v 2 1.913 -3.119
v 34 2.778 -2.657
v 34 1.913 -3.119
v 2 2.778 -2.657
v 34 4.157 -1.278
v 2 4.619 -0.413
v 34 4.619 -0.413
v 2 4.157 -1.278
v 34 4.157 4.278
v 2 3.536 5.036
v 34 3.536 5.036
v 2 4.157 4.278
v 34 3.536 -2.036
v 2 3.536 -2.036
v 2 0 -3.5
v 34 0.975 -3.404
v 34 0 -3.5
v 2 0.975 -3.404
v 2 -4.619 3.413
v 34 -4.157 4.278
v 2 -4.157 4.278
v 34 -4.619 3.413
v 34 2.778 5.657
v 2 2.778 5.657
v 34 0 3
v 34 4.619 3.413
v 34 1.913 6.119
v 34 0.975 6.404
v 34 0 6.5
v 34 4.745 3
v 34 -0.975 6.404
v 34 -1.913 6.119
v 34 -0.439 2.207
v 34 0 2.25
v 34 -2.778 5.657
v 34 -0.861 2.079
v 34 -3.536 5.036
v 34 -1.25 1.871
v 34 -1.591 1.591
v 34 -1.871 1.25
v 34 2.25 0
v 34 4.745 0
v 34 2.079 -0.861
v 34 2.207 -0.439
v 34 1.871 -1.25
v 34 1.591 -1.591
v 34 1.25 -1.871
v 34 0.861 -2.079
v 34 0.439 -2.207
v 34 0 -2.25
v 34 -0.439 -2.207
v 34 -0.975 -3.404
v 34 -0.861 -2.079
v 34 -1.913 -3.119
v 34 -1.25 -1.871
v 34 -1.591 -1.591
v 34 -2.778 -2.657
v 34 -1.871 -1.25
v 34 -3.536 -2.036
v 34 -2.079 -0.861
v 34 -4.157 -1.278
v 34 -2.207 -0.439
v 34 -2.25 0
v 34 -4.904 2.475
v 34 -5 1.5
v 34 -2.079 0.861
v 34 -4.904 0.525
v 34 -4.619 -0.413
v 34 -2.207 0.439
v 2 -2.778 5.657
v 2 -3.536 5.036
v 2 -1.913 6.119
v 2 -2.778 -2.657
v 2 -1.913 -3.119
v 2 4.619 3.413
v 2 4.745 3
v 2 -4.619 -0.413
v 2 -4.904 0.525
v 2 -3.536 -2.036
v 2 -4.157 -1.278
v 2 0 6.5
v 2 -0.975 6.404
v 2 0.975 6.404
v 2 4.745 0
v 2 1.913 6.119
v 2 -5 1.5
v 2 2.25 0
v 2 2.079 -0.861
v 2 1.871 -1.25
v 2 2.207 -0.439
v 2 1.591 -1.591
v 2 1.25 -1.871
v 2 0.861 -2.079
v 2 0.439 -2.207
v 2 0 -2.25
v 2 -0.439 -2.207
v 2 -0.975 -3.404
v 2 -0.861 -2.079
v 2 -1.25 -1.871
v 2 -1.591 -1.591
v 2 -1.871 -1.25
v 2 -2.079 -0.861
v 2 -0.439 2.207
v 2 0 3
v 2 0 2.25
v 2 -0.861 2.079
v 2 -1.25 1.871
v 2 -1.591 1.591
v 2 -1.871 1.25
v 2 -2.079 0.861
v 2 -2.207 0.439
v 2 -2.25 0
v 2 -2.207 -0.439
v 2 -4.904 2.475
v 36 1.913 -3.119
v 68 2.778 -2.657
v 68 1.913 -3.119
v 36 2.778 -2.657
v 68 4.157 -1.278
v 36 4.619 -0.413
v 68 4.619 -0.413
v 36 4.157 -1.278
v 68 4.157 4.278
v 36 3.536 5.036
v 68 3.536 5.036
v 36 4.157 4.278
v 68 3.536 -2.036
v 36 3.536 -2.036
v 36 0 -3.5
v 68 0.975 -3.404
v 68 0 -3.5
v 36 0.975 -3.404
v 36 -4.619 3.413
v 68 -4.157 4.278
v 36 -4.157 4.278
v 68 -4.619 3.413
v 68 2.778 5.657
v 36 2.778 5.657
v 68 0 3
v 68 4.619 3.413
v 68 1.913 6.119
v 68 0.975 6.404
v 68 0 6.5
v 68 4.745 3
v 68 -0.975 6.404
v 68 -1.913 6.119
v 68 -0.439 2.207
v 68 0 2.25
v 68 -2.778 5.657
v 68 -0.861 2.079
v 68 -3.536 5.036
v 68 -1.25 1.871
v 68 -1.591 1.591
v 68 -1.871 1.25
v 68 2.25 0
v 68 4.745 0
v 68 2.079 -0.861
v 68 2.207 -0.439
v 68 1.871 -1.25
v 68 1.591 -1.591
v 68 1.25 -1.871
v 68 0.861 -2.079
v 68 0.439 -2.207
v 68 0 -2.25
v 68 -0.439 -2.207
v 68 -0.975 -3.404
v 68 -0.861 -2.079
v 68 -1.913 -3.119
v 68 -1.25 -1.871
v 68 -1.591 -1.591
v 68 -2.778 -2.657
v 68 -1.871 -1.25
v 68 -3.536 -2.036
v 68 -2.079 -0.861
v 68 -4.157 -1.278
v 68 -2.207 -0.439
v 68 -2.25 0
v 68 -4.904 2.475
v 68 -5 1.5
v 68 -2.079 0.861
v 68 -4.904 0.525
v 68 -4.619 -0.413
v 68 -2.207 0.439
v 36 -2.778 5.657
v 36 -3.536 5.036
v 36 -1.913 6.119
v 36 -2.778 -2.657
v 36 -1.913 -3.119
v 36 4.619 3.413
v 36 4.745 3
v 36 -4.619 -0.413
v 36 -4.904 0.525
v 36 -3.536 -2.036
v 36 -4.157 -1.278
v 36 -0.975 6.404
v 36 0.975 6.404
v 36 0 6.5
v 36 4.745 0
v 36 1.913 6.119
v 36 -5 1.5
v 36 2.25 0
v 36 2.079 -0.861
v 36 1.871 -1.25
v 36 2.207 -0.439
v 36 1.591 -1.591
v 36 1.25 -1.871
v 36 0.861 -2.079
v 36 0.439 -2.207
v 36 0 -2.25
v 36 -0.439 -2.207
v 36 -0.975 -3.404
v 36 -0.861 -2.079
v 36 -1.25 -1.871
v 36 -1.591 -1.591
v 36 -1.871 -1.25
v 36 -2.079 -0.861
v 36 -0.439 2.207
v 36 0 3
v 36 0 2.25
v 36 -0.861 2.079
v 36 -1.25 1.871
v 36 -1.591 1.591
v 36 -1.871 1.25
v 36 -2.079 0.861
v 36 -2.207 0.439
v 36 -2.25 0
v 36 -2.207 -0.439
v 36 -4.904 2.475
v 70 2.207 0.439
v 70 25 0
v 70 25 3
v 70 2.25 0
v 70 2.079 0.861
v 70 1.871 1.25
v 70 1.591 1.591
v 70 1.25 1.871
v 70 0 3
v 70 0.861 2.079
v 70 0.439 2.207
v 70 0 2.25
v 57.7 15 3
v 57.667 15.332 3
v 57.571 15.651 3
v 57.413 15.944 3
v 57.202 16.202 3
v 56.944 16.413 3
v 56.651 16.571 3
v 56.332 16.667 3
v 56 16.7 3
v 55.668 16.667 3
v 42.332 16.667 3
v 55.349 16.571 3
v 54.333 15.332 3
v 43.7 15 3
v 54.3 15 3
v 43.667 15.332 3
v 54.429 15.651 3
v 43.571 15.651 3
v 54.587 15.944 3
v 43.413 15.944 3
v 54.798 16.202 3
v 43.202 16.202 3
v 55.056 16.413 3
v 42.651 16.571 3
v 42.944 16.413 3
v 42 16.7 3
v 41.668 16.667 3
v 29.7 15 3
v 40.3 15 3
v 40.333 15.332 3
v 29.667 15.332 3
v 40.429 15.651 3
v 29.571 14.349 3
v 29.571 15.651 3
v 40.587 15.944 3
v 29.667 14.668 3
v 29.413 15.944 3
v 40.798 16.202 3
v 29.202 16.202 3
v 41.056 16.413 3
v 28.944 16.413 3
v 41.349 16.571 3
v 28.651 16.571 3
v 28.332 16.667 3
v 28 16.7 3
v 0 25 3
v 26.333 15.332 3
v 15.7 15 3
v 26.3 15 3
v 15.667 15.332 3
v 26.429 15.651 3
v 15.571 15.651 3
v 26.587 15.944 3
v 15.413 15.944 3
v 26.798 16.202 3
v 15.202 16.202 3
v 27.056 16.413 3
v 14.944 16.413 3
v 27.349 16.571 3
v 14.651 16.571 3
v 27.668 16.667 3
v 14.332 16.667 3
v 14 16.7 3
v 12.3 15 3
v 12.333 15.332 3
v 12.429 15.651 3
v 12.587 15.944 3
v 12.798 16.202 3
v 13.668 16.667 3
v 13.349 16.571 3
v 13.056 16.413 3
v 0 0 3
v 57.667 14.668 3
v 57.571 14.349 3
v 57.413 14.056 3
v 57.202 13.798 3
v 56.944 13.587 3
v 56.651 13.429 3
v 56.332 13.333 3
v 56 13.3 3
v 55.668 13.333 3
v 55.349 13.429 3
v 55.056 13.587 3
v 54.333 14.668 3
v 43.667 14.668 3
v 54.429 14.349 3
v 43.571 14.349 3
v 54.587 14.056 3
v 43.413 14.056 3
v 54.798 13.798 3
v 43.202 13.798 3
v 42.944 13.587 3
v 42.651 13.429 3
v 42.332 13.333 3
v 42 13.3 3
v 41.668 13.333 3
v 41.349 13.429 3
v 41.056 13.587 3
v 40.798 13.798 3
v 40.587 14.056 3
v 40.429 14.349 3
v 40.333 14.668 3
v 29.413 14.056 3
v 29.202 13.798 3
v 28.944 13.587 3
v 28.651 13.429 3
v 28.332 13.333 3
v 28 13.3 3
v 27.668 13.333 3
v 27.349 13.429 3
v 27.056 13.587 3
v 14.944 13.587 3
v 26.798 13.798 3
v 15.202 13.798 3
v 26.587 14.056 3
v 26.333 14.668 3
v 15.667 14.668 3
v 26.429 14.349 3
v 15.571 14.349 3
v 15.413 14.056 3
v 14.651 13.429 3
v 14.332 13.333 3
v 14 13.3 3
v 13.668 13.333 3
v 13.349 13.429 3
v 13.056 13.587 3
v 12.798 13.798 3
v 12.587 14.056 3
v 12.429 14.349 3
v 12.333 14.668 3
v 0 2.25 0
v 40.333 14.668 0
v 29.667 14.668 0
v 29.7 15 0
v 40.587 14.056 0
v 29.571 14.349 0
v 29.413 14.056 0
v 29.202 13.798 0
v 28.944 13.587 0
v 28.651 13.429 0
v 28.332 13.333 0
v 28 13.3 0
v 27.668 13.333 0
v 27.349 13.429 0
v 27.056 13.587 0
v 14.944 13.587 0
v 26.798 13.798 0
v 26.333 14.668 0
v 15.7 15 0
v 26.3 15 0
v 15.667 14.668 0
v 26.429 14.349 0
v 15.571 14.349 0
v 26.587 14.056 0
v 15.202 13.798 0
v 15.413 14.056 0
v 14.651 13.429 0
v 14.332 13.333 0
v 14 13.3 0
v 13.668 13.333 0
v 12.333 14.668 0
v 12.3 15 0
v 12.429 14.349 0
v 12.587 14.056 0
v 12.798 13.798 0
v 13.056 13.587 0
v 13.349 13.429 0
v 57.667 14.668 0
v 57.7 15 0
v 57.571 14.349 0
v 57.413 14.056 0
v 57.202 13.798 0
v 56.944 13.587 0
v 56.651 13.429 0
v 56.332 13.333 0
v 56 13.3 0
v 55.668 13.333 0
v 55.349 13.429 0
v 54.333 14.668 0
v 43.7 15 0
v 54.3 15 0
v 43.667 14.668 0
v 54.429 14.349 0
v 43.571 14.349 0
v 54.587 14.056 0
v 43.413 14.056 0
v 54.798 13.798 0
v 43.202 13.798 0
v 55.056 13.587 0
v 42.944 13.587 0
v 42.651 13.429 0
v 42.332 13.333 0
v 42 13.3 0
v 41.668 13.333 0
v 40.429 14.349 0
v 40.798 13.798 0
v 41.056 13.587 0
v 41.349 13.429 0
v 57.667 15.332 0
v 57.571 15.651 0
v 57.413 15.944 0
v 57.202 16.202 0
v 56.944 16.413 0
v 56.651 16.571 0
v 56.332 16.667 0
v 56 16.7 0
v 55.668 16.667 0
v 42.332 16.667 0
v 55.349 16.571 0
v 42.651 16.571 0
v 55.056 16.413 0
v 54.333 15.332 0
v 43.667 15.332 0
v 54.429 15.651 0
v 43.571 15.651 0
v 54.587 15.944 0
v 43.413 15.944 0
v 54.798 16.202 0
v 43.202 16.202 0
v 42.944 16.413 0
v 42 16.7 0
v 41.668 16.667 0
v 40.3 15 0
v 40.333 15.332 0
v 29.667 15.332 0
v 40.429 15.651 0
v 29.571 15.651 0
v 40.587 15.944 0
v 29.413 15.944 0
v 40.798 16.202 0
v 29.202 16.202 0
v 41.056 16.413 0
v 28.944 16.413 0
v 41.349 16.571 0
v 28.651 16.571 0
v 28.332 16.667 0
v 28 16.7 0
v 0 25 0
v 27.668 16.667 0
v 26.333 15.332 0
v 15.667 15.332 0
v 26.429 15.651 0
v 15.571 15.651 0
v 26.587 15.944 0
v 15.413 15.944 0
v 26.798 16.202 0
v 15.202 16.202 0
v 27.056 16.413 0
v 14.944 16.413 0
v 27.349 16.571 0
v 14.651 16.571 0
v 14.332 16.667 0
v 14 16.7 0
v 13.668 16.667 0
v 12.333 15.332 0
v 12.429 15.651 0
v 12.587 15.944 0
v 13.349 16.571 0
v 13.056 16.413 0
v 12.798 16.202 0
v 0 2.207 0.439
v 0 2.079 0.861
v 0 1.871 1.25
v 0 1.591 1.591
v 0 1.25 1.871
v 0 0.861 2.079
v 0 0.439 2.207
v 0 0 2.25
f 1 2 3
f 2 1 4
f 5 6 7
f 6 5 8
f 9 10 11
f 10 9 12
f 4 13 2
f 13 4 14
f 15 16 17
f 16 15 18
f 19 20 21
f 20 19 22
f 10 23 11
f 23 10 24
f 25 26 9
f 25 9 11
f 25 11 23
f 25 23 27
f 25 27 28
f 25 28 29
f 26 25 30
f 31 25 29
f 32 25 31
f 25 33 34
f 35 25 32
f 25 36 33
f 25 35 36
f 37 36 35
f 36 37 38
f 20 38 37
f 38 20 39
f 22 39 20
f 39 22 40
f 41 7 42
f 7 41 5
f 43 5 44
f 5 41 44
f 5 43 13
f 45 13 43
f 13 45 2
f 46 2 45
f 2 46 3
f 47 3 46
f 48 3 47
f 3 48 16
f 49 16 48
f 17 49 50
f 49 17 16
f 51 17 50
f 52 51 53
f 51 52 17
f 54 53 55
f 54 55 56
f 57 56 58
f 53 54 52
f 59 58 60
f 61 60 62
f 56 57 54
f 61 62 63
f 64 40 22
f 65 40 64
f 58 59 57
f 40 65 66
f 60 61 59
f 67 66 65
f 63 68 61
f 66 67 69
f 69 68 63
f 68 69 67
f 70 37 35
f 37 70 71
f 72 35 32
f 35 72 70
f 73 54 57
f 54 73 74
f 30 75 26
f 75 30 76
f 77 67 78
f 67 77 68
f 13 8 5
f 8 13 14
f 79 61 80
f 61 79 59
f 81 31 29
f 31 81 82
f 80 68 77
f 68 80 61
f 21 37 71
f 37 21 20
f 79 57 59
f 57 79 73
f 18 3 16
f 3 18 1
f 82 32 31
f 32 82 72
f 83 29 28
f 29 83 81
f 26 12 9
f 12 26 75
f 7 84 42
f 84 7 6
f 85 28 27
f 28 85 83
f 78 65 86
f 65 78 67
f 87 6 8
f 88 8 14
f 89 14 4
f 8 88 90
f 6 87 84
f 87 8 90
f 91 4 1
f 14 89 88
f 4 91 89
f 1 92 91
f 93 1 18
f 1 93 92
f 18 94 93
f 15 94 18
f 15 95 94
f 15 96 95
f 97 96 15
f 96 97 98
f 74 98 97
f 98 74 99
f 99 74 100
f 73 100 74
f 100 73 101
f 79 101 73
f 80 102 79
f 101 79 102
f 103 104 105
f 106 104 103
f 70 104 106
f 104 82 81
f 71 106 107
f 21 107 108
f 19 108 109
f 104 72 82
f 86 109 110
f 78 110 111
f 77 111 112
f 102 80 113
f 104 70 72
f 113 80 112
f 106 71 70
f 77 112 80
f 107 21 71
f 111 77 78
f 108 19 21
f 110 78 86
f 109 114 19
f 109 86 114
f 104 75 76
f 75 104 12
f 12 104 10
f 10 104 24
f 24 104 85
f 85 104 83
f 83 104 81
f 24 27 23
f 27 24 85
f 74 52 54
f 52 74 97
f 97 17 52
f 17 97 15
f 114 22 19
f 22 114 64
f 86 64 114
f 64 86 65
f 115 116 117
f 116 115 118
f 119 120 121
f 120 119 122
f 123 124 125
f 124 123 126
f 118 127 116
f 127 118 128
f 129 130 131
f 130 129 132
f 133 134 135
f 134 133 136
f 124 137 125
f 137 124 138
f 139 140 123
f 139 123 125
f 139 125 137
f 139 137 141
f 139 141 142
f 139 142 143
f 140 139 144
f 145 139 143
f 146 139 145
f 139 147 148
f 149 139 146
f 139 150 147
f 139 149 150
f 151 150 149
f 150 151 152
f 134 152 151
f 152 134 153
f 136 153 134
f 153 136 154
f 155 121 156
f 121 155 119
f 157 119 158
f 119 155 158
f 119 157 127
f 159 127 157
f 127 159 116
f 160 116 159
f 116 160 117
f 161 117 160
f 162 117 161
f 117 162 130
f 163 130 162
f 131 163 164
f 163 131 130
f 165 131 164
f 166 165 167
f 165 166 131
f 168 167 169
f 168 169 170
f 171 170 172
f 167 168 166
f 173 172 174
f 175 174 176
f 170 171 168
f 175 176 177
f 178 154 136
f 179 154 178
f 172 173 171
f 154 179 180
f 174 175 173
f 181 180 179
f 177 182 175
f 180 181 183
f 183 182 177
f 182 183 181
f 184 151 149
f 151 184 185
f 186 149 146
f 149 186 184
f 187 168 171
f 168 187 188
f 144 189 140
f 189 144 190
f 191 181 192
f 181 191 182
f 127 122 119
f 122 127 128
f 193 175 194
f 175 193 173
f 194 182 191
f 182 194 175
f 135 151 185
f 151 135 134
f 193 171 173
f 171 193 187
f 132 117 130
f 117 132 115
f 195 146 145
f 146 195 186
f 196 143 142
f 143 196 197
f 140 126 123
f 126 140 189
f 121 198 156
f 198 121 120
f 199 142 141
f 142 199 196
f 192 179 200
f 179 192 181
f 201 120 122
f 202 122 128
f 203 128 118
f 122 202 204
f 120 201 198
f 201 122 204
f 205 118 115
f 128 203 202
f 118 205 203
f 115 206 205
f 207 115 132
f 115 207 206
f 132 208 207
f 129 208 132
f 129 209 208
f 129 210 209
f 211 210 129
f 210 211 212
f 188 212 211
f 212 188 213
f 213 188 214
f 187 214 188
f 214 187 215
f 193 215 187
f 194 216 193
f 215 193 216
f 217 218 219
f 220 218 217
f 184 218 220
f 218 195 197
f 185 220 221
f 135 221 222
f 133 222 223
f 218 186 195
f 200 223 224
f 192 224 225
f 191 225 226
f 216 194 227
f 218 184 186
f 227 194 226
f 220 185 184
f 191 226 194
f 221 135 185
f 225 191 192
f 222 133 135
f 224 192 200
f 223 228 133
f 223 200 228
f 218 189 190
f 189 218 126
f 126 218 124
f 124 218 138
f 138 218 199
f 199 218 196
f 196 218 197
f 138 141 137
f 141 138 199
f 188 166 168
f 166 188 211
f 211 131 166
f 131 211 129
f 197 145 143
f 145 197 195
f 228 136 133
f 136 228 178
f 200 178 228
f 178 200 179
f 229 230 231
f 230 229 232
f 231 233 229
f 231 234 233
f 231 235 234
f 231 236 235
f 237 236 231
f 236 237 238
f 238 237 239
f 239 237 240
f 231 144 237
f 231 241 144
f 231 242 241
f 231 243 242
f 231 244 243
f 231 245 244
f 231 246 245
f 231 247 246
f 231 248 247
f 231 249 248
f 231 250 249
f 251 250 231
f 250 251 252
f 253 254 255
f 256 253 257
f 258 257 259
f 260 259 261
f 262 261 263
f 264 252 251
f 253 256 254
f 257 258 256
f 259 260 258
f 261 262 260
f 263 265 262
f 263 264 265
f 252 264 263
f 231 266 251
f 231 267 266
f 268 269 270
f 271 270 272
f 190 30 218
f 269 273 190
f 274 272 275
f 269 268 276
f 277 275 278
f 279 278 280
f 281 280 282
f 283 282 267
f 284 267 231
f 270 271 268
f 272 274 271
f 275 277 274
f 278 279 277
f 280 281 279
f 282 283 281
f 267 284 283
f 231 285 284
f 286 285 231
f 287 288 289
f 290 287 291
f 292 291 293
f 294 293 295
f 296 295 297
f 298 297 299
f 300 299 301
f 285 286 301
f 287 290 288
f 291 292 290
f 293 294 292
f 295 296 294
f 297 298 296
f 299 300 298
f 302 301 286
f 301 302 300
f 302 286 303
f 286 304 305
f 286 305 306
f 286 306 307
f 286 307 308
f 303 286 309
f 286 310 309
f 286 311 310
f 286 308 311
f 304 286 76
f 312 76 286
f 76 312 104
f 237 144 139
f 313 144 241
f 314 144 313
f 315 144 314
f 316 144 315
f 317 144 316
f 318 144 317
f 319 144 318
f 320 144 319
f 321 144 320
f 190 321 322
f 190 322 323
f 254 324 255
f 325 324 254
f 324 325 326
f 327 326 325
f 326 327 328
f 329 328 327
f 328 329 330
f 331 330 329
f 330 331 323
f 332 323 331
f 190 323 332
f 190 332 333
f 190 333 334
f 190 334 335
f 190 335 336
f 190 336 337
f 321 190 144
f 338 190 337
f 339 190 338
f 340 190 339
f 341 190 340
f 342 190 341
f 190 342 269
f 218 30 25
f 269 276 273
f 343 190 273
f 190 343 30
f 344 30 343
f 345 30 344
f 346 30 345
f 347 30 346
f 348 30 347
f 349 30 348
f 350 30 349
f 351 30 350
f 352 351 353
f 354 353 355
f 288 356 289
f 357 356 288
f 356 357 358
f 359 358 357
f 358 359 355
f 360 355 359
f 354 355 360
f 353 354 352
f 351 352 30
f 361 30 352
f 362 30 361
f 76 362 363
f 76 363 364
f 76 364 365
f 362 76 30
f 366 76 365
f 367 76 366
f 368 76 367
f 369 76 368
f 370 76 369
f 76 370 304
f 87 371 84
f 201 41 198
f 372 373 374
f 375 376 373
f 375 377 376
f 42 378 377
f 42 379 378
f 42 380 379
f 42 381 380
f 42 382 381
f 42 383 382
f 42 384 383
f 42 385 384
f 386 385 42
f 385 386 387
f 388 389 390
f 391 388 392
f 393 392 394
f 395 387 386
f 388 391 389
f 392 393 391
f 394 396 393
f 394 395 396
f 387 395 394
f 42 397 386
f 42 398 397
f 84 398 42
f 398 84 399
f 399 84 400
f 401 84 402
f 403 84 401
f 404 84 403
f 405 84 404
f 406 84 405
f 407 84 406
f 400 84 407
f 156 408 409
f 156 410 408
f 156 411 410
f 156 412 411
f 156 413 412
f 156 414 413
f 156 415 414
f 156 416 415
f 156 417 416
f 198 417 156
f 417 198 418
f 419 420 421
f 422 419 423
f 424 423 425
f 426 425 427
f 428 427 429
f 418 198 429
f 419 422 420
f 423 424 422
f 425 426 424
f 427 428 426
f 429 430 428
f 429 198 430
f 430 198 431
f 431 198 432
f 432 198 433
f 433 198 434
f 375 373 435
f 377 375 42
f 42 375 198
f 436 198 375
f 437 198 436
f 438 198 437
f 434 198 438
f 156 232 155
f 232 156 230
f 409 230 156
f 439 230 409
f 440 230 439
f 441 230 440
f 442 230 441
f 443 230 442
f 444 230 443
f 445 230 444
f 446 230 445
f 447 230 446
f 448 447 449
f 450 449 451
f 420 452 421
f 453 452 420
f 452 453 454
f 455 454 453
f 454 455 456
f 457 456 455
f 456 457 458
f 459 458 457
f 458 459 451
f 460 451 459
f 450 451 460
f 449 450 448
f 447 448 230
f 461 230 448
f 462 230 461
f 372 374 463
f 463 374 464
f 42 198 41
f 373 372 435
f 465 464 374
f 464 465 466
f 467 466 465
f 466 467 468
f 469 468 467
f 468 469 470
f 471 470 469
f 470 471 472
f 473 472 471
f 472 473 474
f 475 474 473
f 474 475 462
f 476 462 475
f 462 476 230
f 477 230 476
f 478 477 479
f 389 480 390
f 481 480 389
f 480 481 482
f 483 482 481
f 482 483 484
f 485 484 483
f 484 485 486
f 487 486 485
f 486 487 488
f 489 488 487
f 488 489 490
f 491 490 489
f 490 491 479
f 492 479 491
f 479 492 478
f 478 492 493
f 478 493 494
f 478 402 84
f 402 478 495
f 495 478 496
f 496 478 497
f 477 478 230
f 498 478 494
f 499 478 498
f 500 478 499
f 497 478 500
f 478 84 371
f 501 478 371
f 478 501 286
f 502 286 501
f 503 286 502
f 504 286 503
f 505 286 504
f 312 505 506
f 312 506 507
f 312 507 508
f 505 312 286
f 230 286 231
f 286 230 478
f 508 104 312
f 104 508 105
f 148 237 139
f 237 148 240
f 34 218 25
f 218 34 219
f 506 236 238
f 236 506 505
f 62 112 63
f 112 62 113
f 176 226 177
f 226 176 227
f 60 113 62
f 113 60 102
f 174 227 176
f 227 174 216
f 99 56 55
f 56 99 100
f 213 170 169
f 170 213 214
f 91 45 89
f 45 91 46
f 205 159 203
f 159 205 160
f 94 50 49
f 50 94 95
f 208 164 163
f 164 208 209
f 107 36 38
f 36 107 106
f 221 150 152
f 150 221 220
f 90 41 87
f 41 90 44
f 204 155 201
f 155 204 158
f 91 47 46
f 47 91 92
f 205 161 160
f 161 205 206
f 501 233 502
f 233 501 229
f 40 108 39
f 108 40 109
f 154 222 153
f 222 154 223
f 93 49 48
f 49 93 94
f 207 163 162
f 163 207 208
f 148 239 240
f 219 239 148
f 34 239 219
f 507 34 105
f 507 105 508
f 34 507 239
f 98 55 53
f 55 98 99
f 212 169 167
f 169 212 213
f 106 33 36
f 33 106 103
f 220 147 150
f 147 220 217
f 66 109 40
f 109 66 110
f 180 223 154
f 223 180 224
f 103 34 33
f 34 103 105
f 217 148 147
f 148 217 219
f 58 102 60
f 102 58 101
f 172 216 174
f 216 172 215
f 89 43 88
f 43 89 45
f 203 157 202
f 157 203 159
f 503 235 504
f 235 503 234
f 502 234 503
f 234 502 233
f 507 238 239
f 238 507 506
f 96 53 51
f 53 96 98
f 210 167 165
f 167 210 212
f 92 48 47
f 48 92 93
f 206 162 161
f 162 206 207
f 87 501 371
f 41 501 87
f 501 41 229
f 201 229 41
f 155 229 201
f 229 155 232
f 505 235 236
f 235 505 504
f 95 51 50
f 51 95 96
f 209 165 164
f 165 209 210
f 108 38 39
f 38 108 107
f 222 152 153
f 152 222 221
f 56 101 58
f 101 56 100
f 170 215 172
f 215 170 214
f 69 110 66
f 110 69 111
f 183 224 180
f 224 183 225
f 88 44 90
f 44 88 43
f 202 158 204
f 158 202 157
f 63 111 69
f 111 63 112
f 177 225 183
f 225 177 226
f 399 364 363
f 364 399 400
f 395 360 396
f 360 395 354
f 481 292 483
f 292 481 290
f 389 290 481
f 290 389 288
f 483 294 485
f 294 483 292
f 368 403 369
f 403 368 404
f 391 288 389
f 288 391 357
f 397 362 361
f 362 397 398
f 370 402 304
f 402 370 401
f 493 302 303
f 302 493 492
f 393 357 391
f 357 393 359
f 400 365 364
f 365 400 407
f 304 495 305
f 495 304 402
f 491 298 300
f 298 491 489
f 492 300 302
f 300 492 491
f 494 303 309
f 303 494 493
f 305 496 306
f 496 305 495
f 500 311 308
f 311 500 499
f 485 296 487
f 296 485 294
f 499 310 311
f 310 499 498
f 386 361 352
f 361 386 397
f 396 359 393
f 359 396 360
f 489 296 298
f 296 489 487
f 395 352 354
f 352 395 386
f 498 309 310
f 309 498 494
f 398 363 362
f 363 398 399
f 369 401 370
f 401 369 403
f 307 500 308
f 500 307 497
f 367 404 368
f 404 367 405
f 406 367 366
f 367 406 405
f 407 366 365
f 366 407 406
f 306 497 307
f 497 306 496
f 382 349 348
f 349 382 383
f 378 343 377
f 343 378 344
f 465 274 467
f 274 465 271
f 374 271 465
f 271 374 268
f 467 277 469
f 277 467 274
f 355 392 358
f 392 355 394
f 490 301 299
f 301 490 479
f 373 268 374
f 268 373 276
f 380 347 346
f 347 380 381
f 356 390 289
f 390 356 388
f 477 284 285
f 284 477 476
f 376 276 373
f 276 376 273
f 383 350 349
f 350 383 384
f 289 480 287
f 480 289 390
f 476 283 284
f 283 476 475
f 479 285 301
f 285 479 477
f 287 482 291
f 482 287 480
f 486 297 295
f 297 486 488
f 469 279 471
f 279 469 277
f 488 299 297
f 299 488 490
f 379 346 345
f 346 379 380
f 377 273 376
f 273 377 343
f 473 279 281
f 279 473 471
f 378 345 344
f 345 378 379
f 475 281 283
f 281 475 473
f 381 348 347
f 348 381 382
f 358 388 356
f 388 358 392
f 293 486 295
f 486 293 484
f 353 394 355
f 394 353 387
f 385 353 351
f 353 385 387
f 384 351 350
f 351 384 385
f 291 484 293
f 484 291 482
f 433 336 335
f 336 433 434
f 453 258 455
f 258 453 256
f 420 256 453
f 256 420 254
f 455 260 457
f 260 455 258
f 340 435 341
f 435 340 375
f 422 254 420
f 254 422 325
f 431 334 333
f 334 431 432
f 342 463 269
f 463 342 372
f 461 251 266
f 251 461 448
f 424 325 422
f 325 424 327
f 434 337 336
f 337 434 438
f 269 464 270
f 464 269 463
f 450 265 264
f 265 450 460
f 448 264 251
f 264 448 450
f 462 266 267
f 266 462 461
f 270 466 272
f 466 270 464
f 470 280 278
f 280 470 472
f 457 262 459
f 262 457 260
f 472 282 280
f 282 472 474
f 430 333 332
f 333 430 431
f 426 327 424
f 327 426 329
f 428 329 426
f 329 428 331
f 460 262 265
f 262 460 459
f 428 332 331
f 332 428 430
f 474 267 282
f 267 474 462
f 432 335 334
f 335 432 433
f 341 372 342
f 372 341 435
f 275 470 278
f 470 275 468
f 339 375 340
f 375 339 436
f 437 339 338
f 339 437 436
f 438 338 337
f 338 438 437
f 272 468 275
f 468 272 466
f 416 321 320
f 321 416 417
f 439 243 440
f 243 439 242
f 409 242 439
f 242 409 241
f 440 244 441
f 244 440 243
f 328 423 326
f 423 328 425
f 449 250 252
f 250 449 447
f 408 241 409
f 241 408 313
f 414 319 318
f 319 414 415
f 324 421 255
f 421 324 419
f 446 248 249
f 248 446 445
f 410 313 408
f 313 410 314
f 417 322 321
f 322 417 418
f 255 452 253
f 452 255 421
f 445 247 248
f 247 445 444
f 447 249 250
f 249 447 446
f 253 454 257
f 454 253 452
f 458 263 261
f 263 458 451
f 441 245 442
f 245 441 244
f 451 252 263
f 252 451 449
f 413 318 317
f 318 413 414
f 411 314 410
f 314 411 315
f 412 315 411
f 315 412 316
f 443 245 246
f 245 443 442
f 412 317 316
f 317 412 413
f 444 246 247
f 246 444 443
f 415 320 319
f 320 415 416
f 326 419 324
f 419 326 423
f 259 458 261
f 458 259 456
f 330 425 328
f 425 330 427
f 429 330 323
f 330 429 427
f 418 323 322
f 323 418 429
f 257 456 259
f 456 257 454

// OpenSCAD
$fn = 32;

// ----------------------------------------------------------------------
// Hinge leaf: 70 x 30 x 10 mm
// ----------------------------------------------------------------------

// --- parameters (mm) ---
plate_len = 70;           // leaf length, X
plate_w = 25;             // leaf width, Y
plate_t = 3;              // leaf thickness
barrel_d = 10;            // knuckle diameter
barrel_w = 32;            // knuckle width
knuckle_n = 2;            // number of knuckles
pin_d = 4.5;              // pin bore
gap = 2;                  // gap between the knuckles
screw_d = 3.4;            // screw clearance

module leaf() {
  cube([plate_len, plate_w, plate_t]);
}

module knuckles() {
  /* barrels sit on the leaf edge, the pin axis at half the leaf thickness */
  for (i = [0 : knuckle_n - 1])
    translate([gap + i * (barrel_w + gap), 0, plate_t * 0.5])
      rotate([0, 90, 0]) cylinder(h = barrel_w, d = barrel_d);
}

difference() {
  union() {
    leaf();
    knuckles();
  }
  rotate([0, 90, 0]) translate([0, 0, -1])
    cylinder(h = plate_len + 2, d = pin_d);
  translate([14, plate_w * 0.6, -1]) cylinder(h = plate_t + 2, d = screw_d);
  translate([28, plate_w * 0.6, -1]) cylinder(h = plate_t + 2, d = screw_d);
  translate([42, plate_w * 0.6, -1]) cylinder(h = plate_t + 2, d = screw_d);
  translate([56, plate_w * 0.6, -1]) cylinder(h = plate_t + 2, d = screw_d);
}
